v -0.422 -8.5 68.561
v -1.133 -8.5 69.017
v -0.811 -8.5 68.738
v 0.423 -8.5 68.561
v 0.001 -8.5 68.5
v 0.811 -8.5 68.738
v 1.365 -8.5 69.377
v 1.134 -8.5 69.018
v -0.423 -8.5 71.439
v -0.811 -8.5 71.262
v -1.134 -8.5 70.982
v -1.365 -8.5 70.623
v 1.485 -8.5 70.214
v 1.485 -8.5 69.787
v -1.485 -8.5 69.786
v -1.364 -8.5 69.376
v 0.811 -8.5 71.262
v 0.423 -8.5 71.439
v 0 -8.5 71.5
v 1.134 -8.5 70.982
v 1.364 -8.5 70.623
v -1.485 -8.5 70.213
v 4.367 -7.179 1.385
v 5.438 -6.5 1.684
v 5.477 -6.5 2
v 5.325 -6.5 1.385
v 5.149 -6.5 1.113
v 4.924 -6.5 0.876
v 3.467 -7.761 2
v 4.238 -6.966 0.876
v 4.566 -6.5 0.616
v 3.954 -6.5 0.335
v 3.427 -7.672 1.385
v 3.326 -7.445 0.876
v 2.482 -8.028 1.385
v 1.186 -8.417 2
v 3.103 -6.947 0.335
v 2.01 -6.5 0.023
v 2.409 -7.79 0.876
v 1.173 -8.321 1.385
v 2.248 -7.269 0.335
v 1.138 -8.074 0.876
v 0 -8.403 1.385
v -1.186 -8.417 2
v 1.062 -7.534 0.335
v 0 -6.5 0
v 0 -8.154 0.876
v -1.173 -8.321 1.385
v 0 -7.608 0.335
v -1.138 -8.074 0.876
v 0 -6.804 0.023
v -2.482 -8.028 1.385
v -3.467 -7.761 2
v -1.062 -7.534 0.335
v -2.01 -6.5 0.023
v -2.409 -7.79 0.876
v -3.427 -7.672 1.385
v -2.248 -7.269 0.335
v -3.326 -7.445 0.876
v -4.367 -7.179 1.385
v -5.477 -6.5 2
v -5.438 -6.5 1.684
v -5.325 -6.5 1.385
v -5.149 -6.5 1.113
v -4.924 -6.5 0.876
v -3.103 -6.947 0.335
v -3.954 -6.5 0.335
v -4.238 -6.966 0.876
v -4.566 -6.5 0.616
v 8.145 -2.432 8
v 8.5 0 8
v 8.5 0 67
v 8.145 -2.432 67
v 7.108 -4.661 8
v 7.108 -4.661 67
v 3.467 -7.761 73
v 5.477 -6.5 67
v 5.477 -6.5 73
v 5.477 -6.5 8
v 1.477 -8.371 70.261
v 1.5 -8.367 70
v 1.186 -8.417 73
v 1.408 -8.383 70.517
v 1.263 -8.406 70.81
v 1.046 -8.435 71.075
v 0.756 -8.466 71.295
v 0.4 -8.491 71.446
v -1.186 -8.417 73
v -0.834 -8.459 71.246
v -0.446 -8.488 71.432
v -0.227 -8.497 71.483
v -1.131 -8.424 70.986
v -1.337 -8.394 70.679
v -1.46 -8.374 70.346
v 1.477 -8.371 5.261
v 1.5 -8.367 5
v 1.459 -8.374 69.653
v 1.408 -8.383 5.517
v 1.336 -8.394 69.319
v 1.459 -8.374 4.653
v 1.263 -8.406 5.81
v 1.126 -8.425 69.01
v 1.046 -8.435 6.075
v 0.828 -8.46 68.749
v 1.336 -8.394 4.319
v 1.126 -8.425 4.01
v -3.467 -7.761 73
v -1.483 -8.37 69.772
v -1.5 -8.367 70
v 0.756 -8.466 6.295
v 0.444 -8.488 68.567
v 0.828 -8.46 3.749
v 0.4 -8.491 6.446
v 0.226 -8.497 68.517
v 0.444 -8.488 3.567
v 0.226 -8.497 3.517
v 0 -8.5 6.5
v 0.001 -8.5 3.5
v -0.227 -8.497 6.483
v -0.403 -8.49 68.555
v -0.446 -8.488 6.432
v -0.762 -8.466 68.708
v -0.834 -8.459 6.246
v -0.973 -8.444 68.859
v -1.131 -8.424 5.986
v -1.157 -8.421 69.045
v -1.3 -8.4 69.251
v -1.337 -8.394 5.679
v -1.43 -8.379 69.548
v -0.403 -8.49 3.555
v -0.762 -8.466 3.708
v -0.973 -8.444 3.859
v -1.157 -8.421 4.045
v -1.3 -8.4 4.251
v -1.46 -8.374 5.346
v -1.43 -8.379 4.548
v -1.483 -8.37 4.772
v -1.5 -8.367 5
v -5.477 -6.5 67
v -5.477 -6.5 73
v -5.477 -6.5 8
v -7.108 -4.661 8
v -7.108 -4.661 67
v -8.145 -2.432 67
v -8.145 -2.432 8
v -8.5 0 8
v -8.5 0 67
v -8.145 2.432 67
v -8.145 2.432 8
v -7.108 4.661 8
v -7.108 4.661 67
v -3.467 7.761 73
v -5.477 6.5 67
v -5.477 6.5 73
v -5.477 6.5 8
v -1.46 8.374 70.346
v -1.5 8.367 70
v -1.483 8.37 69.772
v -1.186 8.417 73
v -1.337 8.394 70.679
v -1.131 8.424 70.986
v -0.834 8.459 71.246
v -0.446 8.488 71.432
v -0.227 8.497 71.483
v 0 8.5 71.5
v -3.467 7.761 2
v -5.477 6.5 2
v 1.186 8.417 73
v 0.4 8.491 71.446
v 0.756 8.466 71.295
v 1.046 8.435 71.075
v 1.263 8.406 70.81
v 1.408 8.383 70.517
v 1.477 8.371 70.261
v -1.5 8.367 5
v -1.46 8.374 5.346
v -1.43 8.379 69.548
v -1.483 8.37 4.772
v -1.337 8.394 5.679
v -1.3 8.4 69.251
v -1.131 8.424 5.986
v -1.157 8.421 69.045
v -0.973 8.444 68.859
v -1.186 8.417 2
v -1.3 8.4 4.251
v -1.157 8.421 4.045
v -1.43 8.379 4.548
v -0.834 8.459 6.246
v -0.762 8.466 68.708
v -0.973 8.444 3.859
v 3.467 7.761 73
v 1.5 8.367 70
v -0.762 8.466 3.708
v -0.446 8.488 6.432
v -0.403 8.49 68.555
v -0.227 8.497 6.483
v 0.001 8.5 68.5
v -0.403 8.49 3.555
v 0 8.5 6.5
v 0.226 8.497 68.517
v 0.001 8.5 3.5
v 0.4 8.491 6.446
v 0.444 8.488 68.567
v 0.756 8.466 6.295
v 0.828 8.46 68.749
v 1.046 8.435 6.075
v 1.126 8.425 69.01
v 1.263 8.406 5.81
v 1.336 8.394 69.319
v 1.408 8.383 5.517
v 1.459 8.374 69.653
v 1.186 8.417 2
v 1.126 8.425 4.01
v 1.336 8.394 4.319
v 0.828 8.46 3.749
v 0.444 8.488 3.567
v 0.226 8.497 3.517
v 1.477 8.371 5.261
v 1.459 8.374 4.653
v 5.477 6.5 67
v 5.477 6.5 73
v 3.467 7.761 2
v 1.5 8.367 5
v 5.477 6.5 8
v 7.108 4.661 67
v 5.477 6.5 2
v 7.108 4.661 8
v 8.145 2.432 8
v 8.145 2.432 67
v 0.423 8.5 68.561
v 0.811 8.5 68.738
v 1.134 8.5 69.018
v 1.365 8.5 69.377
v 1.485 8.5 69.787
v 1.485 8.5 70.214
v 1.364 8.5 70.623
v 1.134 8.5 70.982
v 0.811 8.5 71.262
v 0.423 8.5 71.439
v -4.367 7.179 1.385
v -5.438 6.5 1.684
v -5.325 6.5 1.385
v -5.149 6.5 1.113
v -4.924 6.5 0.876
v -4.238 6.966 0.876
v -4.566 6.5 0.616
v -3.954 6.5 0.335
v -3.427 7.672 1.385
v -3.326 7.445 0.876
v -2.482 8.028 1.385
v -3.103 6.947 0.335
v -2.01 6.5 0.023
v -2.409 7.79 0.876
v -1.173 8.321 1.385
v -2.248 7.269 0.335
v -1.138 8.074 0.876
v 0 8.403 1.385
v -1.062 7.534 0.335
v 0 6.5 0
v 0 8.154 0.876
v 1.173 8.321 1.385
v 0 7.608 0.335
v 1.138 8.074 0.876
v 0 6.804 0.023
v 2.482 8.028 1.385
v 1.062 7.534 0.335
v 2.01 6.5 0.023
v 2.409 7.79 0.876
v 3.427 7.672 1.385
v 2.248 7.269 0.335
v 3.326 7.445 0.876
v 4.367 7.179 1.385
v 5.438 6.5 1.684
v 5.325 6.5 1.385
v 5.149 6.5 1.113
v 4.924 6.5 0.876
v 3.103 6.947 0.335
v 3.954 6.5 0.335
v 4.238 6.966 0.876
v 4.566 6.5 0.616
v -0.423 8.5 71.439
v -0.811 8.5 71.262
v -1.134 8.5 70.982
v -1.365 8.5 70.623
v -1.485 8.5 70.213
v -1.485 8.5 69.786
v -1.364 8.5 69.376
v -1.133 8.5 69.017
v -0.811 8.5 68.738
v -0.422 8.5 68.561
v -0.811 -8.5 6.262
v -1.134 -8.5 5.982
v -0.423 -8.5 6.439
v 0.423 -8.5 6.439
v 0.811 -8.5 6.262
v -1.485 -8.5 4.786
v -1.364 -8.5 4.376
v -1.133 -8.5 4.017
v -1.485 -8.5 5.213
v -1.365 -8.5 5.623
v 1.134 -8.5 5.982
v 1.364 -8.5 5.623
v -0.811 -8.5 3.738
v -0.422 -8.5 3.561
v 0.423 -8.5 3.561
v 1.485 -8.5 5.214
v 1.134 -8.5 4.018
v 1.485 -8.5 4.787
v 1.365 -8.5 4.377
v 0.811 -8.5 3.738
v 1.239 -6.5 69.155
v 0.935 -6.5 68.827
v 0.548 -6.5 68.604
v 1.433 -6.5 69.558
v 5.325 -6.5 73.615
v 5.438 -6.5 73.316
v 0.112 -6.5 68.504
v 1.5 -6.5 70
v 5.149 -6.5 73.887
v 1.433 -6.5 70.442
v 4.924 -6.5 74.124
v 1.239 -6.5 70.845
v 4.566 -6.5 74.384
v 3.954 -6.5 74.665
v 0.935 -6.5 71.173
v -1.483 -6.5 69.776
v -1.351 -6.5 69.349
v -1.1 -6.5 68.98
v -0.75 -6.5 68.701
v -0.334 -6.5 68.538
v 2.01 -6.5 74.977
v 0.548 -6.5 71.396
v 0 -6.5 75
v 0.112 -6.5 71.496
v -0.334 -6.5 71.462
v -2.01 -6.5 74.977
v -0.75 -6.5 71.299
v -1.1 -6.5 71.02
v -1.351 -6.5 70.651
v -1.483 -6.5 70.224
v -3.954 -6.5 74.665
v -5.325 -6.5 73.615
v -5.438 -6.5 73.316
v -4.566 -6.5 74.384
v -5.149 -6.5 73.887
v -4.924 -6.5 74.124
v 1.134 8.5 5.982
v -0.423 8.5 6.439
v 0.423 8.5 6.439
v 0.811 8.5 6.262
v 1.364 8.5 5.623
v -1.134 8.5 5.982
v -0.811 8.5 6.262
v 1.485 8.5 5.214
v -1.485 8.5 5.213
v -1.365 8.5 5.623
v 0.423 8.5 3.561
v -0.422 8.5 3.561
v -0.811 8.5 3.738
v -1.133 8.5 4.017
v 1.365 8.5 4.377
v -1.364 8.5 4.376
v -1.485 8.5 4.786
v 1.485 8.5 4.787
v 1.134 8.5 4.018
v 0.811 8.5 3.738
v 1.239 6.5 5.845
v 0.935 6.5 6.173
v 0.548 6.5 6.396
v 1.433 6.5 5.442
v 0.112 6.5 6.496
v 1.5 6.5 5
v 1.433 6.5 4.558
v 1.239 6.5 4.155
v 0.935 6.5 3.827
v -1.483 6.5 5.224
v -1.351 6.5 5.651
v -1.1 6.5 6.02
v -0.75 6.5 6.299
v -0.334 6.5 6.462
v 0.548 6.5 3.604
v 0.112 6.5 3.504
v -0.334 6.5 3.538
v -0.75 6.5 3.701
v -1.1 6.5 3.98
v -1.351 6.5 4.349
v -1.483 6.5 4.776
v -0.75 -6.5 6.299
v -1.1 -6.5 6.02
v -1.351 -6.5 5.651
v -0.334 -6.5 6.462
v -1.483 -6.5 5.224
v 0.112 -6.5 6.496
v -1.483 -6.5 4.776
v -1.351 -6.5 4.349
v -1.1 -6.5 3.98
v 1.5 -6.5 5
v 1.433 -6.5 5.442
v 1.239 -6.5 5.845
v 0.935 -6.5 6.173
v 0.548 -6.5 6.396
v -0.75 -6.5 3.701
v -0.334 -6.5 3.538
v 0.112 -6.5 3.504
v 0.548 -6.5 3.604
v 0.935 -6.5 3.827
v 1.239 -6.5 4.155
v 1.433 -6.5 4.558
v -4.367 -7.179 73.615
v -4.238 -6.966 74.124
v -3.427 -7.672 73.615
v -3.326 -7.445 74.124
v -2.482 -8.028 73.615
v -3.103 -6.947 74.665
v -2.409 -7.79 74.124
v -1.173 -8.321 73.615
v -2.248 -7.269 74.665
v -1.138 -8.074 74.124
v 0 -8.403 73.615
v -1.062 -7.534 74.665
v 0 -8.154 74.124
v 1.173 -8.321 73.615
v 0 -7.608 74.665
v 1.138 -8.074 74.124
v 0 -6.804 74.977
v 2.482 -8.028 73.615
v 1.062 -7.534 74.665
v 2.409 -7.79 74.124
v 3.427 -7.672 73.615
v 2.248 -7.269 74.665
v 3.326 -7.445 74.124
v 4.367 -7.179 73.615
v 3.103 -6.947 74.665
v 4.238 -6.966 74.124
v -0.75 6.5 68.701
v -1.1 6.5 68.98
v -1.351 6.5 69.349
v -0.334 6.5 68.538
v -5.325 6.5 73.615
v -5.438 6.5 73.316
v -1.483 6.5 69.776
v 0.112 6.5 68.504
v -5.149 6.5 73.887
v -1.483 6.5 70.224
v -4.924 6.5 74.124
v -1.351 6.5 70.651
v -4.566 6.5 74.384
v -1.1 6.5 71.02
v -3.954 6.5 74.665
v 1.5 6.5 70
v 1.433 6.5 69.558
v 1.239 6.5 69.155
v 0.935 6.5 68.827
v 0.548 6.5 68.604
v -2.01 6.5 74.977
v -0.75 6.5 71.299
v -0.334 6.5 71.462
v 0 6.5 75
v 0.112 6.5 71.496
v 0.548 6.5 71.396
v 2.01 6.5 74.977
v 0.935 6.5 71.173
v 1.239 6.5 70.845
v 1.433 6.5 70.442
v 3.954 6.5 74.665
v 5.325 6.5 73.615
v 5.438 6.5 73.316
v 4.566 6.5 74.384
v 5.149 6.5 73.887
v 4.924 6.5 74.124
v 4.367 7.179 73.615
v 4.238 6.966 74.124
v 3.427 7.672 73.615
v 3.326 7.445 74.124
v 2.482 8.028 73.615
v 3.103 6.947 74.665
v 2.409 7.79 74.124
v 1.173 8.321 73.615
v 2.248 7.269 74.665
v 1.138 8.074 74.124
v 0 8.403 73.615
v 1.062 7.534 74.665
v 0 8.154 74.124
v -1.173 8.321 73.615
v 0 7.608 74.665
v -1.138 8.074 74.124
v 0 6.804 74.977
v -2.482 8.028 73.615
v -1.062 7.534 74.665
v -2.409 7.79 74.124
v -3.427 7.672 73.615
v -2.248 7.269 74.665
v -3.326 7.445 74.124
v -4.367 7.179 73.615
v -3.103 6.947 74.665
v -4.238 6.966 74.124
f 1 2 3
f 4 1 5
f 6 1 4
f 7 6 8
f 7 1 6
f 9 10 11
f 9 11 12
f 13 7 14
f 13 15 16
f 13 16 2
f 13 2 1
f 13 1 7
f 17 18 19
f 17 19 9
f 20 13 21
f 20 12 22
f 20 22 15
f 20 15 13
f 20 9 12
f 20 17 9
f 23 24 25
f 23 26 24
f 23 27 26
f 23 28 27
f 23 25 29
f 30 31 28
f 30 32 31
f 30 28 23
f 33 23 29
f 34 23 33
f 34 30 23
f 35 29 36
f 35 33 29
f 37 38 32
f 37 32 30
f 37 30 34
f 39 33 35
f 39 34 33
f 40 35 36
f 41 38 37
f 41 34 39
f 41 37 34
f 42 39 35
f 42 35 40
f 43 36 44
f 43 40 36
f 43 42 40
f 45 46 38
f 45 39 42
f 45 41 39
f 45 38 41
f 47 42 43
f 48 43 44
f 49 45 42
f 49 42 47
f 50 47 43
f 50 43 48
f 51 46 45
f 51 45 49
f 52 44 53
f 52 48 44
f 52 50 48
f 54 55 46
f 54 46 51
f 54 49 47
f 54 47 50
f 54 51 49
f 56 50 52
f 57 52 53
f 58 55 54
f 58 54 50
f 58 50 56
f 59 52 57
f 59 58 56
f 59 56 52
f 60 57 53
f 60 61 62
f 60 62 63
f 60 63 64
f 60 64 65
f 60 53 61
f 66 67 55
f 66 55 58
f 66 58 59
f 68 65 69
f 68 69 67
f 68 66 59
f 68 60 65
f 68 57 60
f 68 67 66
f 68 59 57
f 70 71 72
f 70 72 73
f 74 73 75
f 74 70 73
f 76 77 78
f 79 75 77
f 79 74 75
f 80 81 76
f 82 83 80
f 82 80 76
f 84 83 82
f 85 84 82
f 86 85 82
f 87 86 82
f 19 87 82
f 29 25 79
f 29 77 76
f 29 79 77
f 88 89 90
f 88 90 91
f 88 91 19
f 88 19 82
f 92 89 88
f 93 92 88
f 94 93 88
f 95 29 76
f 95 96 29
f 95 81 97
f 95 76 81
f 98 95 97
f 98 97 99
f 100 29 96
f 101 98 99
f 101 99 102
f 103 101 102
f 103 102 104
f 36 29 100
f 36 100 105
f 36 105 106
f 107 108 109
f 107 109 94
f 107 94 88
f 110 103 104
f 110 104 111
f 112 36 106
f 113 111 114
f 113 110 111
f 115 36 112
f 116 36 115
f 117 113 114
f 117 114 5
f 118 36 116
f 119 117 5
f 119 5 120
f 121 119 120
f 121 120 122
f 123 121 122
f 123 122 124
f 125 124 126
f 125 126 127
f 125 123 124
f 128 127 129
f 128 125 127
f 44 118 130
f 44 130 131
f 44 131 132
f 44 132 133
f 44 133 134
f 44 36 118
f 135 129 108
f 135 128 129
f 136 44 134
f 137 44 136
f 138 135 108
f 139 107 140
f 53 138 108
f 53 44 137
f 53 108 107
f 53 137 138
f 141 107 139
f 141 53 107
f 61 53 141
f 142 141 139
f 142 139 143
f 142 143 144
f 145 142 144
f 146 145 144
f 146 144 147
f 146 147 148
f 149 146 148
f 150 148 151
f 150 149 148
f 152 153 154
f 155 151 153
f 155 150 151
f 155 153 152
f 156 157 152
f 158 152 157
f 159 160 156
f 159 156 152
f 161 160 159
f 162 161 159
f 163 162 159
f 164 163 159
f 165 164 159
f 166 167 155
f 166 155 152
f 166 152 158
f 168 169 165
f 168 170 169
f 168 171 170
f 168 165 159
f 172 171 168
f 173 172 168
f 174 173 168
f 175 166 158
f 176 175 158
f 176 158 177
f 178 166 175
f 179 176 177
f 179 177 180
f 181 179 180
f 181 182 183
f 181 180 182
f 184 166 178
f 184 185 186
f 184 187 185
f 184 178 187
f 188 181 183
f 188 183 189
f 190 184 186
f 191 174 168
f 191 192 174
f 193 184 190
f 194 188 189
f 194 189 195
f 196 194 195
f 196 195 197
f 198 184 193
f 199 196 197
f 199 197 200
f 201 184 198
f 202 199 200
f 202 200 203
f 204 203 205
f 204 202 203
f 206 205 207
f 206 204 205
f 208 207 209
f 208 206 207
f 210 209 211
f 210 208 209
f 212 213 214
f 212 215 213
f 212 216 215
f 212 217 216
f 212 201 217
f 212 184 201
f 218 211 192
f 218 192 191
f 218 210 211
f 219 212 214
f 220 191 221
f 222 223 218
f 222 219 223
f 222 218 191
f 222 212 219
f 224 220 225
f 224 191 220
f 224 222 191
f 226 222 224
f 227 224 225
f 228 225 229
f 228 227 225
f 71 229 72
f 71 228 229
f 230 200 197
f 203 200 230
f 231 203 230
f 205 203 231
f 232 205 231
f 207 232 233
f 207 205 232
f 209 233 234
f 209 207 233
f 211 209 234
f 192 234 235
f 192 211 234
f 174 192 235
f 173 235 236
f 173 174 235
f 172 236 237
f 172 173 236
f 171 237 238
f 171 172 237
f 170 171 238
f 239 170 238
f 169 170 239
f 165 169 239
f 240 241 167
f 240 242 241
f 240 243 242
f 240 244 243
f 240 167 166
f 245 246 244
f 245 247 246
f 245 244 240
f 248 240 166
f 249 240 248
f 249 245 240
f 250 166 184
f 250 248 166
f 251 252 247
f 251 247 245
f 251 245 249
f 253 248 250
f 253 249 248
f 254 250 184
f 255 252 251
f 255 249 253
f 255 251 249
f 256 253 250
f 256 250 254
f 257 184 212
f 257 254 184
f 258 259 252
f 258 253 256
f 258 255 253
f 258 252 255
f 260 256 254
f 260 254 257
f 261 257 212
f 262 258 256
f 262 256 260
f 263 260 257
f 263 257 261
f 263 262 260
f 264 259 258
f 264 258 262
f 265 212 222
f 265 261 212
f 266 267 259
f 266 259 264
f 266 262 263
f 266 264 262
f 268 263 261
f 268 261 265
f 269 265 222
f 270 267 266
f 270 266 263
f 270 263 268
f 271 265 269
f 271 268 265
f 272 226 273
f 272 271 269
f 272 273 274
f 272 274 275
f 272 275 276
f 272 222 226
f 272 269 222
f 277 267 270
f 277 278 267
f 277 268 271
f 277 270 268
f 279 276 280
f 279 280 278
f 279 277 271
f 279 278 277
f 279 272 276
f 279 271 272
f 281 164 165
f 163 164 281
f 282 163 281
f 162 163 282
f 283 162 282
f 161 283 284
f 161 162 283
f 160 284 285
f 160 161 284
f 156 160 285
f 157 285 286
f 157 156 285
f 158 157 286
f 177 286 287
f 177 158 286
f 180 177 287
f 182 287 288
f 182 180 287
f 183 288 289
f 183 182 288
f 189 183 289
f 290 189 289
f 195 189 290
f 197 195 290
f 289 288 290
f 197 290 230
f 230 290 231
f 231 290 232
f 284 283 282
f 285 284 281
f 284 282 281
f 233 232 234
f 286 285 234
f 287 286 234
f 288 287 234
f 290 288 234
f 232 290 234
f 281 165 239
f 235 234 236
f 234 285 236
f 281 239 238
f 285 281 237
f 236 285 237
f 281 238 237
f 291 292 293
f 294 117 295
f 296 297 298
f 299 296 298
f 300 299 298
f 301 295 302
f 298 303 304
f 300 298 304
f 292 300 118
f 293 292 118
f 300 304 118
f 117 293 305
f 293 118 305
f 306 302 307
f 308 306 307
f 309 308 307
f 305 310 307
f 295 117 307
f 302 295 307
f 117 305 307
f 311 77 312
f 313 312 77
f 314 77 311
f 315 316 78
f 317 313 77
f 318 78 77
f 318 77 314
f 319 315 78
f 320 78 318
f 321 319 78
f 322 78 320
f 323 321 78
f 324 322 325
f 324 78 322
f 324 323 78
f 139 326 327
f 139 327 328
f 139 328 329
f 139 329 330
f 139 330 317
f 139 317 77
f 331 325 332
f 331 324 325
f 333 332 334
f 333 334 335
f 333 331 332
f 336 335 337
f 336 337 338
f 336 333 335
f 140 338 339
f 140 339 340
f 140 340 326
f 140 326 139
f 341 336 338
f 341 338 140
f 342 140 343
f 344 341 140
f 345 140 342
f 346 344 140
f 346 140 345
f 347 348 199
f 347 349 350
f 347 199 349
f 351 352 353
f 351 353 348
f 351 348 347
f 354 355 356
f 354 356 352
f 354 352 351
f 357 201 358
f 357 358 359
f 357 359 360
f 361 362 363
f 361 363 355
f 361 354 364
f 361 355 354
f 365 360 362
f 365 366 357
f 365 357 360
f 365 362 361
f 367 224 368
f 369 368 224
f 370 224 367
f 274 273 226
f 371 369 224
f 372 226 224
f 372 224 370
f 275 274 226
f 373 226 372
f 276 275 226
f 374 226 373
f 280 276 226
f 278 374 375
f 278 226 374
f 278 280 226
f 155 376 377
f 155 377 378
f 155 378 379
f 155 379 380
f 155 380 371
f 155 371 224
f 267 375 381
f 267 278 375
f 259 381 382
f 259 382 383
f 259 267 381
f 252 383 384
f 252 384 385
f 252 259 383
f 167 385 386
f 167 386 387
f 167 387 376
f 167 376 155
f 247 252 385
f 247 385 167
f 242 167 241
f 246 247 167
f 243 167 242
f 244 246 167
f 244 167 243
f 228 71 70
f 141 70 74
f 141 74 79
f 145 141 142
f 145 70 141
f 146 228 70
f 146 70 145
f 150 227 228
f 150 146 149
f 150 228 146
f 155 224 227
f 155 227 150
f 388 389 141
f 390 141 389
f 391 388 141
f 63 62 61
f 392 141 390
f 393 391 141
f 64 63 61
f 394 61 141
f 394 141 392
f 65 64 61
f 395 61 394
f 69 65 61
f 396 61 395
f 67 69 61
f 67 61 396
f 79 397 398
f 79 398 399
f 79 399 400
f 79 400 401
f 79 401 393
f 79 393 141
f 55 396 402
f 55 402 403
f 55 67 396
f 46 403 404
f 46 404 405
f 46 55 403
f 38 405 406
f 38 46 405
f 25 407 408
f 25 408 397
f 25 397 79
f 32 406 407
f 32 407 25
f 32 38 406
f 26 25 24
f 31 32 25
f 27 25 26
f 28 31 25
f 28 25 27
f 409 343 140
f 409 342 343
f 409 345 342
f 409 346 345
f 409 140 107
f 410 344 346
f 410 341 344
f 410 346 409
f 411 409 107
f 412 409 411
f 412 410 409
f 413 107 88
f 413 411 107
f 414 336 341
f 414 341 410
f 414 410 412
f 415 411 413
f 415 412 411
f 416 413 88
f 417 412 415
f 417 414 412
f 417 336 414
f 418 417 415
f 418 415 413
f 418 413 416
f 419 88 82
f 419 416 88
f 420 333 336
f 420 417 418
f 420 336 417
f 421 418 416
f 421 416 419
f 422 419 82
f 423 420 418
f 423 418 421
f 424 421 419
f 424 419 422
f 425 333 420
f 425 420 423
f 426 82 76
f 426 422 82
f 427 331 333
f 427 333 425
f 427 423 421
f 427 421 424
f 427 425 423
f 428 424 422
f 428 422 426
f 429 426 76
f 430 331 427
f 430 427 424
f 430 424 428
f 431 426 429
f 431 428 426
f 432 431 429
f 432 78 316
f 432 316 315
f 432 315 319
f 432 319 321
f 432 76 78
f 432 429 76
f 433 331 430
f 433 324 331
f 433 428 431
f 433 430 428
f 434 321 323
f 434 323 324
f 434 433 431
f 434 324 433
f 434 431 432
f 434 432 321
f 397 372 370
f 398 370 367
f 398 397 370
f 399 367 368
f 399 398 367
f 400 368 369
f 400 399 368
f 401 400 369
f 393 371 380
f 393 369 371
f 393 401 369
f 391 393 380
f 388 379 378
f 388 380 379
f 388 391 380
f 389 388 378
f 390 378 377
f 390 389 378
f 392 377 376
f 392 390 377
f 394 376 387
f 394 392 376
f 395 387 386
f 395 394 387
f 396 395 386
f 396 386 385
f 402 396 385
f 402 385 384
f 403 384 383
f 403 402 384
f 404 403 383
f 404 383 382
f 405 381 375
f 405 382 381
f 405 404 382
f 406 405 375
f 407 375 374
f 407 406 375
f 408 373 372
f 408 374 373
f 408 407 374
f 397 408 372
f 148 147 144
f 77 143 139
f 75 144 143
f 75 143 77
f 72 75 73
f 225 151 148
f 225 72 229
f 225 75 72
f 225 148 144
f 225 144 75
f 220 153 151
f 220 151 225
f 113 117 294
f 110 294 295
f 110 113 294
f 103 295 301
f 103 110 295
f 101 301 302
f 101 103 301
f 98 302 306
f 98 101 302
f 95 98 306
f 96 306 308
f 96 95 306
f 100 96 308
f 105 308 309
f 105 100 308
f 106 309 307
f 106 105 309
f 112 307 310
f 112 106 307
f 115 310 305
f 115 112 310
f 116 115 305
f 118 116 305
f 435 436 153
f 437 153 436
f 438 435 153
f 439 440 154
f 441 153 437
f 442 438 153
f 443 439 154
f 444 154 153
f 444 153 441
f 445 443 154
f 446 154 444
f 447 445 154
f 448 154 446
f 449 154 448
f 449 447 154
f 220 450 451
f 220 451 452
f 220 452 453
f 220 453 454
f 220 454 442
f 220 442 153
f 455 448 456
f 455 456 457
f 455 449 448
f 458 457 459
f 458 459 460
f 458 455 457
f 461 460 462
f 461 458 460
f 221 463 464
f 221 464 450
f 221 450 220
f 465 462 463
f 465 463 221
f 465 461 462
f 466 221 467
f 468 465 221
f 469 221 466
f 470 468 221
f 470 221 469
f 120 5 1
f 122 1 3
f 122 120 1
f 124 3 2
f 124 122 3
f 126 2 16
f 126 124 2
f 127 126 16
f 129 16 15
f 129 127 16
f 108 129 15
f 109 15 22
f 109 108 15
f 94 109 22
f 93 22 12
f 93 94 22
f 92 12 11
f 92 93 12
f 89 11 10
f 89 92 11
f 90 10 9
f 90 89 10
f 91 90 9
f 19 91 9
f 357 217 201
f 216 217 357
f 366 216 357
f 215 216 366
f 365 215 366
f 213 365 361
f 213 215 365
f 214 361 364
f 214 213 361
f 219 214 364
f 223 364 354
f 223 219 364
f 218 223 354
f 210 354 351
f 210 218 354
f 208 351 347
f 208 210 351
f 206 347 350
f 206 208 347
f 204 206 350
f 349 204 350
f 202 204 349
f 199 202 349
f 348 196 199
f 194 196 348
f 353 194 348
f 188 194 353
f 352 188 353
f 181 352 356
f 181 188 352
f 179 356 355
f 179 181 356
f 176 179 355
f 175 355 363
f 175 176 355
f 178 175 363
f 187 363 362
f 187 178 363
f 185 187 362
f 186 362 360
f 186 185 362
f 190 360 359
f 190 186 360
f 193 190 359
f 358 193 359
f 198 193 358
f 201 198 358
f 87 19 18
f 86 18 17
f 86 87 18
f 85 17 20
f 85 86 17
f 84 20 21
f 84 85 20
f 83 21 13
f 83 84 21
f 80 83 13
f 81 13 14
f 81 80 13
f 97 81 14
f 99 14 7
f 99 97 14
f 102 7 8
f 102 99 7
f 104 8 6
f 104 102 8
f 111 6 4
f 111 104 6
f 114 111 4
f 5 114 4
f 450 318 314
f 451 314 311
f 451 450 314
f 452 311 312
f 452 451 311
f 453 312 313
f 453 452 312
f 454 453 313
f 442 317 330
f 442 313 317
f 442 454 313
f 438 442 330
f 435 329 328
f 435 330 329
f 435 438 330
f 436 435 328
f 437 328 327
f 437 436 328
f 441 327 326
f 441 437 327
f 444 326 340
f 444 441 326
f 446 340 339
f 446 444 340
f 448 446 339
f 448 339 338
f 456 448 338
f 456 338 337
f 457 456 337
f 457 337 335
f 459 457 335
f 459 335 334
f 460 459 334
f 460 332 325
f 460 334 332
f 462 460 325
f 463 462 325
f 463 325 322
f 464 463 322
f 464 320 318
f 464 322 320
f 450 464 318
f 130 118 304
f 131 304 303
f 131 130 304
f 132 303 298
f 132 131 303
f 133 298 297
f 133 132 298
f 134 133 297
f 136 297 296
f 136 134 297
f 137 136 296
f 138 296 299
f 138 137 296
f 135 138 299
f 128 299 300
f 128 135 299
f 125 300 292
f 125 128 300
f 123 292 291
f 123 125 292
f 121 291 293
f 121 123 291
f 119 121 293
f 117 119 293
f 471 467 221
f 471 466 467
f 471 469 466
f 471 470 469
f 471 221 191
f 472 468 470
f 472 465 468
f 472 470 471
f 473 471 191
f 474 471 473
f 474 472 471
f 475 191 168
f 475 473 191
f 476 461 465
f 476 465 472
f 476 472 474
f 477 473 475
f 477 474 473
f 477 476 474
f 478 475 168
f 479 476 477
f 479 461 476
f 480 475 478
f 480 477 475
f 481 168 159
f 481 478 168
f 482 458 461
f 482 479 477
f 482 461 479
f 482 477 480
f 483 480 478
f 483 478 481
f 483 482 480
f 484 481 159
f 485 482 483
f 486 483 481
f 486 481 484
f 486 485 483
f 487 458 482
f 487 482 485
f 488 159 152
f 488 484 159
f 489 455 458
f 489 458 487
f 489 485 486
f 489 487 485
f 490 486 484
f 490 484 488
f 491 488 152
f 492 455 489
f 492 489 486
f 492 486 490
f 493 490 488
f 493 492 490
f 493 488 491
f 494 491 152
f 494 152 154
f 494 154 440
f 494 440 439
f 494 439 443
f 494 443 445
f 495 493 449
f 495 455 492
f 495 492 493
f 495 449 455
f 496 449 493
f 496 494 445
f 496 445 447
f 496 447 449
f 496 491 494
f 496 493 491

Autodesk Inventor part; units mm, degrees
ref_plane "YZ Plane" through (0, 0, 0) normal (1, 0, 0) x (0, 1, 0)
ref_plane "XZ Plane" through (0, 0, 0) normal (0, 1, 0) x (-1, 0, 0)
ref_plane "XY Plane" through (0, 0, 0) normal (0, 0, 1) x (1, 0, 0)
sketch "Sketch1" plane through (0, 0, 0) normal (0, 0, 1) x (1, 0, 0)
  circle A0 centre (0, 0) radius 8.5
  dimension "d0" = 17
extrude "Extrusion1" add sketch "Sketch1" along normal blind 75
sketch "Sketch2" plane through (0, 0, 0) normal (0, 1, 0) x (-1, 0, 0)
  circle A0 centre (0, 70) radius 1.5
  line L0 (8.5, 75) -> (-8.5, 75) projected
  circle A1 centre (0, 5) radius 1.5
  line L1 (8.5, 0) -> (-8.5, 0) projected
  point P0 (0, 0)
  dimension "d3" = 3
  dimension "d4" = 5
  dimension "d5" = 3
  dimension "d6" = 5
extrude "Extrusion2" cut sketch "Sketch2" against normal through all both and the other way through all
fillet "Fillet1" radius 2 2 edges at (-8.5, 0, 75) (-8.5, 0, 0)
sketch "Sketch5" plane through (0, 0, 75) normal (0, 0, 1) x (1, 0, 0)
  line L0 (-16.9, 6.5) -> (17, 6.5)
  line L1 (17, 6.5) -> (17, -6.5)
  line L2 (17, -6.5) -> (-16.9, -6.5)
  line L3 (-16.9, -6.5) -> (-16.9, 6.5)
  point P0 (0, 0)
  dimension "d18" = 13
  dimension "d19" = 6.5
extrude "Extrusion5" cut sketch "Sketch5" against normal blind 8
sketch "Sketch6" plane through (0, 0, 0) normal (0, 0, -1) x (-1, 0, 0)
  line L0 (-15.4684, 6.5) -> (16.538, 6.5)
  line L1 (16.538, 6.5) -> (16.538, -6.5)
  line L2 (16.538, -6.5) -> (-15.4684, -6.5)
  line L3 (-15.4684, -6.5) -> (-15.4684, 6.5)
  point P0 (0, 0)
  dimension "d22" = 13
  dimension "d23" = 6.5
extrude "Extrusion6" cut sketch "Sketch6" against normal blind 8
sketch "Sketch7" plane through (-5.4772, -6.5, 8) normal (0, 1, 0) x (1, 0, 0)
  circle A0 centre (5.4772, 3) radius 1.5 projected
  line L0 (10.9545, -59) -> (0, -59) projected
  line L1 (0, -65) -> (0, -59) projected
  line L2 (10.9545, -59) -> (10.9545, -65) projected
  line L3 (10.9545, 0) -> (10.9545, -59) projected
  line L4 (0, 0) -> (10.9545, 0) projected
  line L5 (0, 0) -> (0, 6) projected
  line L6 (10.9545, 6) -> (10.9545, 0) projected
  line L7 (0, -59) -> (0, 0) projected
  circle A1 centre (5.4772, -62) radius 1.5 projected
  point P0 (5.4772, 8)
  point P1 (5.4772, -67)
extrude "Extrusion7" add sketch "Sketch7" along normal blind 15 and the other way blind 2 contours A0
sketch "Sketch8" plane through (-5.4772, 6.5, 67) normal (0, -1, 0) x (1, 0, 0)
  circle A0 centre (5.4772, -62) radius 1.5 projected
  line L0 (0, 0) -> (10.9545, 0) projected
  line L1 (10.9545, 6) -> (10.9545, 0) projected
  line L2 (0, 0) -> (0, 6) projected
  line L3 (0, -59) -> (0, 0) projected
  line L4 (10.9545, -59) -> (0, -59) projected
  line L5 (10.9545, -59) -> (10.9545, -65) projected
  line L6 (0, -65) -> (0, -59) projected
  line L7 (10.9545, 0) -> (10.9545, -59) projected
  circle A1 centre (5.4772, 3) radius 1.5 projected
  point P0 (5.4772, -67)
  point P1 (5.4772, 8)
extrude "Extrusion8" add sketch "Sketch8" along normal blind 15 and the other way blind 2 contours A1
properties part number "cylinder right"
